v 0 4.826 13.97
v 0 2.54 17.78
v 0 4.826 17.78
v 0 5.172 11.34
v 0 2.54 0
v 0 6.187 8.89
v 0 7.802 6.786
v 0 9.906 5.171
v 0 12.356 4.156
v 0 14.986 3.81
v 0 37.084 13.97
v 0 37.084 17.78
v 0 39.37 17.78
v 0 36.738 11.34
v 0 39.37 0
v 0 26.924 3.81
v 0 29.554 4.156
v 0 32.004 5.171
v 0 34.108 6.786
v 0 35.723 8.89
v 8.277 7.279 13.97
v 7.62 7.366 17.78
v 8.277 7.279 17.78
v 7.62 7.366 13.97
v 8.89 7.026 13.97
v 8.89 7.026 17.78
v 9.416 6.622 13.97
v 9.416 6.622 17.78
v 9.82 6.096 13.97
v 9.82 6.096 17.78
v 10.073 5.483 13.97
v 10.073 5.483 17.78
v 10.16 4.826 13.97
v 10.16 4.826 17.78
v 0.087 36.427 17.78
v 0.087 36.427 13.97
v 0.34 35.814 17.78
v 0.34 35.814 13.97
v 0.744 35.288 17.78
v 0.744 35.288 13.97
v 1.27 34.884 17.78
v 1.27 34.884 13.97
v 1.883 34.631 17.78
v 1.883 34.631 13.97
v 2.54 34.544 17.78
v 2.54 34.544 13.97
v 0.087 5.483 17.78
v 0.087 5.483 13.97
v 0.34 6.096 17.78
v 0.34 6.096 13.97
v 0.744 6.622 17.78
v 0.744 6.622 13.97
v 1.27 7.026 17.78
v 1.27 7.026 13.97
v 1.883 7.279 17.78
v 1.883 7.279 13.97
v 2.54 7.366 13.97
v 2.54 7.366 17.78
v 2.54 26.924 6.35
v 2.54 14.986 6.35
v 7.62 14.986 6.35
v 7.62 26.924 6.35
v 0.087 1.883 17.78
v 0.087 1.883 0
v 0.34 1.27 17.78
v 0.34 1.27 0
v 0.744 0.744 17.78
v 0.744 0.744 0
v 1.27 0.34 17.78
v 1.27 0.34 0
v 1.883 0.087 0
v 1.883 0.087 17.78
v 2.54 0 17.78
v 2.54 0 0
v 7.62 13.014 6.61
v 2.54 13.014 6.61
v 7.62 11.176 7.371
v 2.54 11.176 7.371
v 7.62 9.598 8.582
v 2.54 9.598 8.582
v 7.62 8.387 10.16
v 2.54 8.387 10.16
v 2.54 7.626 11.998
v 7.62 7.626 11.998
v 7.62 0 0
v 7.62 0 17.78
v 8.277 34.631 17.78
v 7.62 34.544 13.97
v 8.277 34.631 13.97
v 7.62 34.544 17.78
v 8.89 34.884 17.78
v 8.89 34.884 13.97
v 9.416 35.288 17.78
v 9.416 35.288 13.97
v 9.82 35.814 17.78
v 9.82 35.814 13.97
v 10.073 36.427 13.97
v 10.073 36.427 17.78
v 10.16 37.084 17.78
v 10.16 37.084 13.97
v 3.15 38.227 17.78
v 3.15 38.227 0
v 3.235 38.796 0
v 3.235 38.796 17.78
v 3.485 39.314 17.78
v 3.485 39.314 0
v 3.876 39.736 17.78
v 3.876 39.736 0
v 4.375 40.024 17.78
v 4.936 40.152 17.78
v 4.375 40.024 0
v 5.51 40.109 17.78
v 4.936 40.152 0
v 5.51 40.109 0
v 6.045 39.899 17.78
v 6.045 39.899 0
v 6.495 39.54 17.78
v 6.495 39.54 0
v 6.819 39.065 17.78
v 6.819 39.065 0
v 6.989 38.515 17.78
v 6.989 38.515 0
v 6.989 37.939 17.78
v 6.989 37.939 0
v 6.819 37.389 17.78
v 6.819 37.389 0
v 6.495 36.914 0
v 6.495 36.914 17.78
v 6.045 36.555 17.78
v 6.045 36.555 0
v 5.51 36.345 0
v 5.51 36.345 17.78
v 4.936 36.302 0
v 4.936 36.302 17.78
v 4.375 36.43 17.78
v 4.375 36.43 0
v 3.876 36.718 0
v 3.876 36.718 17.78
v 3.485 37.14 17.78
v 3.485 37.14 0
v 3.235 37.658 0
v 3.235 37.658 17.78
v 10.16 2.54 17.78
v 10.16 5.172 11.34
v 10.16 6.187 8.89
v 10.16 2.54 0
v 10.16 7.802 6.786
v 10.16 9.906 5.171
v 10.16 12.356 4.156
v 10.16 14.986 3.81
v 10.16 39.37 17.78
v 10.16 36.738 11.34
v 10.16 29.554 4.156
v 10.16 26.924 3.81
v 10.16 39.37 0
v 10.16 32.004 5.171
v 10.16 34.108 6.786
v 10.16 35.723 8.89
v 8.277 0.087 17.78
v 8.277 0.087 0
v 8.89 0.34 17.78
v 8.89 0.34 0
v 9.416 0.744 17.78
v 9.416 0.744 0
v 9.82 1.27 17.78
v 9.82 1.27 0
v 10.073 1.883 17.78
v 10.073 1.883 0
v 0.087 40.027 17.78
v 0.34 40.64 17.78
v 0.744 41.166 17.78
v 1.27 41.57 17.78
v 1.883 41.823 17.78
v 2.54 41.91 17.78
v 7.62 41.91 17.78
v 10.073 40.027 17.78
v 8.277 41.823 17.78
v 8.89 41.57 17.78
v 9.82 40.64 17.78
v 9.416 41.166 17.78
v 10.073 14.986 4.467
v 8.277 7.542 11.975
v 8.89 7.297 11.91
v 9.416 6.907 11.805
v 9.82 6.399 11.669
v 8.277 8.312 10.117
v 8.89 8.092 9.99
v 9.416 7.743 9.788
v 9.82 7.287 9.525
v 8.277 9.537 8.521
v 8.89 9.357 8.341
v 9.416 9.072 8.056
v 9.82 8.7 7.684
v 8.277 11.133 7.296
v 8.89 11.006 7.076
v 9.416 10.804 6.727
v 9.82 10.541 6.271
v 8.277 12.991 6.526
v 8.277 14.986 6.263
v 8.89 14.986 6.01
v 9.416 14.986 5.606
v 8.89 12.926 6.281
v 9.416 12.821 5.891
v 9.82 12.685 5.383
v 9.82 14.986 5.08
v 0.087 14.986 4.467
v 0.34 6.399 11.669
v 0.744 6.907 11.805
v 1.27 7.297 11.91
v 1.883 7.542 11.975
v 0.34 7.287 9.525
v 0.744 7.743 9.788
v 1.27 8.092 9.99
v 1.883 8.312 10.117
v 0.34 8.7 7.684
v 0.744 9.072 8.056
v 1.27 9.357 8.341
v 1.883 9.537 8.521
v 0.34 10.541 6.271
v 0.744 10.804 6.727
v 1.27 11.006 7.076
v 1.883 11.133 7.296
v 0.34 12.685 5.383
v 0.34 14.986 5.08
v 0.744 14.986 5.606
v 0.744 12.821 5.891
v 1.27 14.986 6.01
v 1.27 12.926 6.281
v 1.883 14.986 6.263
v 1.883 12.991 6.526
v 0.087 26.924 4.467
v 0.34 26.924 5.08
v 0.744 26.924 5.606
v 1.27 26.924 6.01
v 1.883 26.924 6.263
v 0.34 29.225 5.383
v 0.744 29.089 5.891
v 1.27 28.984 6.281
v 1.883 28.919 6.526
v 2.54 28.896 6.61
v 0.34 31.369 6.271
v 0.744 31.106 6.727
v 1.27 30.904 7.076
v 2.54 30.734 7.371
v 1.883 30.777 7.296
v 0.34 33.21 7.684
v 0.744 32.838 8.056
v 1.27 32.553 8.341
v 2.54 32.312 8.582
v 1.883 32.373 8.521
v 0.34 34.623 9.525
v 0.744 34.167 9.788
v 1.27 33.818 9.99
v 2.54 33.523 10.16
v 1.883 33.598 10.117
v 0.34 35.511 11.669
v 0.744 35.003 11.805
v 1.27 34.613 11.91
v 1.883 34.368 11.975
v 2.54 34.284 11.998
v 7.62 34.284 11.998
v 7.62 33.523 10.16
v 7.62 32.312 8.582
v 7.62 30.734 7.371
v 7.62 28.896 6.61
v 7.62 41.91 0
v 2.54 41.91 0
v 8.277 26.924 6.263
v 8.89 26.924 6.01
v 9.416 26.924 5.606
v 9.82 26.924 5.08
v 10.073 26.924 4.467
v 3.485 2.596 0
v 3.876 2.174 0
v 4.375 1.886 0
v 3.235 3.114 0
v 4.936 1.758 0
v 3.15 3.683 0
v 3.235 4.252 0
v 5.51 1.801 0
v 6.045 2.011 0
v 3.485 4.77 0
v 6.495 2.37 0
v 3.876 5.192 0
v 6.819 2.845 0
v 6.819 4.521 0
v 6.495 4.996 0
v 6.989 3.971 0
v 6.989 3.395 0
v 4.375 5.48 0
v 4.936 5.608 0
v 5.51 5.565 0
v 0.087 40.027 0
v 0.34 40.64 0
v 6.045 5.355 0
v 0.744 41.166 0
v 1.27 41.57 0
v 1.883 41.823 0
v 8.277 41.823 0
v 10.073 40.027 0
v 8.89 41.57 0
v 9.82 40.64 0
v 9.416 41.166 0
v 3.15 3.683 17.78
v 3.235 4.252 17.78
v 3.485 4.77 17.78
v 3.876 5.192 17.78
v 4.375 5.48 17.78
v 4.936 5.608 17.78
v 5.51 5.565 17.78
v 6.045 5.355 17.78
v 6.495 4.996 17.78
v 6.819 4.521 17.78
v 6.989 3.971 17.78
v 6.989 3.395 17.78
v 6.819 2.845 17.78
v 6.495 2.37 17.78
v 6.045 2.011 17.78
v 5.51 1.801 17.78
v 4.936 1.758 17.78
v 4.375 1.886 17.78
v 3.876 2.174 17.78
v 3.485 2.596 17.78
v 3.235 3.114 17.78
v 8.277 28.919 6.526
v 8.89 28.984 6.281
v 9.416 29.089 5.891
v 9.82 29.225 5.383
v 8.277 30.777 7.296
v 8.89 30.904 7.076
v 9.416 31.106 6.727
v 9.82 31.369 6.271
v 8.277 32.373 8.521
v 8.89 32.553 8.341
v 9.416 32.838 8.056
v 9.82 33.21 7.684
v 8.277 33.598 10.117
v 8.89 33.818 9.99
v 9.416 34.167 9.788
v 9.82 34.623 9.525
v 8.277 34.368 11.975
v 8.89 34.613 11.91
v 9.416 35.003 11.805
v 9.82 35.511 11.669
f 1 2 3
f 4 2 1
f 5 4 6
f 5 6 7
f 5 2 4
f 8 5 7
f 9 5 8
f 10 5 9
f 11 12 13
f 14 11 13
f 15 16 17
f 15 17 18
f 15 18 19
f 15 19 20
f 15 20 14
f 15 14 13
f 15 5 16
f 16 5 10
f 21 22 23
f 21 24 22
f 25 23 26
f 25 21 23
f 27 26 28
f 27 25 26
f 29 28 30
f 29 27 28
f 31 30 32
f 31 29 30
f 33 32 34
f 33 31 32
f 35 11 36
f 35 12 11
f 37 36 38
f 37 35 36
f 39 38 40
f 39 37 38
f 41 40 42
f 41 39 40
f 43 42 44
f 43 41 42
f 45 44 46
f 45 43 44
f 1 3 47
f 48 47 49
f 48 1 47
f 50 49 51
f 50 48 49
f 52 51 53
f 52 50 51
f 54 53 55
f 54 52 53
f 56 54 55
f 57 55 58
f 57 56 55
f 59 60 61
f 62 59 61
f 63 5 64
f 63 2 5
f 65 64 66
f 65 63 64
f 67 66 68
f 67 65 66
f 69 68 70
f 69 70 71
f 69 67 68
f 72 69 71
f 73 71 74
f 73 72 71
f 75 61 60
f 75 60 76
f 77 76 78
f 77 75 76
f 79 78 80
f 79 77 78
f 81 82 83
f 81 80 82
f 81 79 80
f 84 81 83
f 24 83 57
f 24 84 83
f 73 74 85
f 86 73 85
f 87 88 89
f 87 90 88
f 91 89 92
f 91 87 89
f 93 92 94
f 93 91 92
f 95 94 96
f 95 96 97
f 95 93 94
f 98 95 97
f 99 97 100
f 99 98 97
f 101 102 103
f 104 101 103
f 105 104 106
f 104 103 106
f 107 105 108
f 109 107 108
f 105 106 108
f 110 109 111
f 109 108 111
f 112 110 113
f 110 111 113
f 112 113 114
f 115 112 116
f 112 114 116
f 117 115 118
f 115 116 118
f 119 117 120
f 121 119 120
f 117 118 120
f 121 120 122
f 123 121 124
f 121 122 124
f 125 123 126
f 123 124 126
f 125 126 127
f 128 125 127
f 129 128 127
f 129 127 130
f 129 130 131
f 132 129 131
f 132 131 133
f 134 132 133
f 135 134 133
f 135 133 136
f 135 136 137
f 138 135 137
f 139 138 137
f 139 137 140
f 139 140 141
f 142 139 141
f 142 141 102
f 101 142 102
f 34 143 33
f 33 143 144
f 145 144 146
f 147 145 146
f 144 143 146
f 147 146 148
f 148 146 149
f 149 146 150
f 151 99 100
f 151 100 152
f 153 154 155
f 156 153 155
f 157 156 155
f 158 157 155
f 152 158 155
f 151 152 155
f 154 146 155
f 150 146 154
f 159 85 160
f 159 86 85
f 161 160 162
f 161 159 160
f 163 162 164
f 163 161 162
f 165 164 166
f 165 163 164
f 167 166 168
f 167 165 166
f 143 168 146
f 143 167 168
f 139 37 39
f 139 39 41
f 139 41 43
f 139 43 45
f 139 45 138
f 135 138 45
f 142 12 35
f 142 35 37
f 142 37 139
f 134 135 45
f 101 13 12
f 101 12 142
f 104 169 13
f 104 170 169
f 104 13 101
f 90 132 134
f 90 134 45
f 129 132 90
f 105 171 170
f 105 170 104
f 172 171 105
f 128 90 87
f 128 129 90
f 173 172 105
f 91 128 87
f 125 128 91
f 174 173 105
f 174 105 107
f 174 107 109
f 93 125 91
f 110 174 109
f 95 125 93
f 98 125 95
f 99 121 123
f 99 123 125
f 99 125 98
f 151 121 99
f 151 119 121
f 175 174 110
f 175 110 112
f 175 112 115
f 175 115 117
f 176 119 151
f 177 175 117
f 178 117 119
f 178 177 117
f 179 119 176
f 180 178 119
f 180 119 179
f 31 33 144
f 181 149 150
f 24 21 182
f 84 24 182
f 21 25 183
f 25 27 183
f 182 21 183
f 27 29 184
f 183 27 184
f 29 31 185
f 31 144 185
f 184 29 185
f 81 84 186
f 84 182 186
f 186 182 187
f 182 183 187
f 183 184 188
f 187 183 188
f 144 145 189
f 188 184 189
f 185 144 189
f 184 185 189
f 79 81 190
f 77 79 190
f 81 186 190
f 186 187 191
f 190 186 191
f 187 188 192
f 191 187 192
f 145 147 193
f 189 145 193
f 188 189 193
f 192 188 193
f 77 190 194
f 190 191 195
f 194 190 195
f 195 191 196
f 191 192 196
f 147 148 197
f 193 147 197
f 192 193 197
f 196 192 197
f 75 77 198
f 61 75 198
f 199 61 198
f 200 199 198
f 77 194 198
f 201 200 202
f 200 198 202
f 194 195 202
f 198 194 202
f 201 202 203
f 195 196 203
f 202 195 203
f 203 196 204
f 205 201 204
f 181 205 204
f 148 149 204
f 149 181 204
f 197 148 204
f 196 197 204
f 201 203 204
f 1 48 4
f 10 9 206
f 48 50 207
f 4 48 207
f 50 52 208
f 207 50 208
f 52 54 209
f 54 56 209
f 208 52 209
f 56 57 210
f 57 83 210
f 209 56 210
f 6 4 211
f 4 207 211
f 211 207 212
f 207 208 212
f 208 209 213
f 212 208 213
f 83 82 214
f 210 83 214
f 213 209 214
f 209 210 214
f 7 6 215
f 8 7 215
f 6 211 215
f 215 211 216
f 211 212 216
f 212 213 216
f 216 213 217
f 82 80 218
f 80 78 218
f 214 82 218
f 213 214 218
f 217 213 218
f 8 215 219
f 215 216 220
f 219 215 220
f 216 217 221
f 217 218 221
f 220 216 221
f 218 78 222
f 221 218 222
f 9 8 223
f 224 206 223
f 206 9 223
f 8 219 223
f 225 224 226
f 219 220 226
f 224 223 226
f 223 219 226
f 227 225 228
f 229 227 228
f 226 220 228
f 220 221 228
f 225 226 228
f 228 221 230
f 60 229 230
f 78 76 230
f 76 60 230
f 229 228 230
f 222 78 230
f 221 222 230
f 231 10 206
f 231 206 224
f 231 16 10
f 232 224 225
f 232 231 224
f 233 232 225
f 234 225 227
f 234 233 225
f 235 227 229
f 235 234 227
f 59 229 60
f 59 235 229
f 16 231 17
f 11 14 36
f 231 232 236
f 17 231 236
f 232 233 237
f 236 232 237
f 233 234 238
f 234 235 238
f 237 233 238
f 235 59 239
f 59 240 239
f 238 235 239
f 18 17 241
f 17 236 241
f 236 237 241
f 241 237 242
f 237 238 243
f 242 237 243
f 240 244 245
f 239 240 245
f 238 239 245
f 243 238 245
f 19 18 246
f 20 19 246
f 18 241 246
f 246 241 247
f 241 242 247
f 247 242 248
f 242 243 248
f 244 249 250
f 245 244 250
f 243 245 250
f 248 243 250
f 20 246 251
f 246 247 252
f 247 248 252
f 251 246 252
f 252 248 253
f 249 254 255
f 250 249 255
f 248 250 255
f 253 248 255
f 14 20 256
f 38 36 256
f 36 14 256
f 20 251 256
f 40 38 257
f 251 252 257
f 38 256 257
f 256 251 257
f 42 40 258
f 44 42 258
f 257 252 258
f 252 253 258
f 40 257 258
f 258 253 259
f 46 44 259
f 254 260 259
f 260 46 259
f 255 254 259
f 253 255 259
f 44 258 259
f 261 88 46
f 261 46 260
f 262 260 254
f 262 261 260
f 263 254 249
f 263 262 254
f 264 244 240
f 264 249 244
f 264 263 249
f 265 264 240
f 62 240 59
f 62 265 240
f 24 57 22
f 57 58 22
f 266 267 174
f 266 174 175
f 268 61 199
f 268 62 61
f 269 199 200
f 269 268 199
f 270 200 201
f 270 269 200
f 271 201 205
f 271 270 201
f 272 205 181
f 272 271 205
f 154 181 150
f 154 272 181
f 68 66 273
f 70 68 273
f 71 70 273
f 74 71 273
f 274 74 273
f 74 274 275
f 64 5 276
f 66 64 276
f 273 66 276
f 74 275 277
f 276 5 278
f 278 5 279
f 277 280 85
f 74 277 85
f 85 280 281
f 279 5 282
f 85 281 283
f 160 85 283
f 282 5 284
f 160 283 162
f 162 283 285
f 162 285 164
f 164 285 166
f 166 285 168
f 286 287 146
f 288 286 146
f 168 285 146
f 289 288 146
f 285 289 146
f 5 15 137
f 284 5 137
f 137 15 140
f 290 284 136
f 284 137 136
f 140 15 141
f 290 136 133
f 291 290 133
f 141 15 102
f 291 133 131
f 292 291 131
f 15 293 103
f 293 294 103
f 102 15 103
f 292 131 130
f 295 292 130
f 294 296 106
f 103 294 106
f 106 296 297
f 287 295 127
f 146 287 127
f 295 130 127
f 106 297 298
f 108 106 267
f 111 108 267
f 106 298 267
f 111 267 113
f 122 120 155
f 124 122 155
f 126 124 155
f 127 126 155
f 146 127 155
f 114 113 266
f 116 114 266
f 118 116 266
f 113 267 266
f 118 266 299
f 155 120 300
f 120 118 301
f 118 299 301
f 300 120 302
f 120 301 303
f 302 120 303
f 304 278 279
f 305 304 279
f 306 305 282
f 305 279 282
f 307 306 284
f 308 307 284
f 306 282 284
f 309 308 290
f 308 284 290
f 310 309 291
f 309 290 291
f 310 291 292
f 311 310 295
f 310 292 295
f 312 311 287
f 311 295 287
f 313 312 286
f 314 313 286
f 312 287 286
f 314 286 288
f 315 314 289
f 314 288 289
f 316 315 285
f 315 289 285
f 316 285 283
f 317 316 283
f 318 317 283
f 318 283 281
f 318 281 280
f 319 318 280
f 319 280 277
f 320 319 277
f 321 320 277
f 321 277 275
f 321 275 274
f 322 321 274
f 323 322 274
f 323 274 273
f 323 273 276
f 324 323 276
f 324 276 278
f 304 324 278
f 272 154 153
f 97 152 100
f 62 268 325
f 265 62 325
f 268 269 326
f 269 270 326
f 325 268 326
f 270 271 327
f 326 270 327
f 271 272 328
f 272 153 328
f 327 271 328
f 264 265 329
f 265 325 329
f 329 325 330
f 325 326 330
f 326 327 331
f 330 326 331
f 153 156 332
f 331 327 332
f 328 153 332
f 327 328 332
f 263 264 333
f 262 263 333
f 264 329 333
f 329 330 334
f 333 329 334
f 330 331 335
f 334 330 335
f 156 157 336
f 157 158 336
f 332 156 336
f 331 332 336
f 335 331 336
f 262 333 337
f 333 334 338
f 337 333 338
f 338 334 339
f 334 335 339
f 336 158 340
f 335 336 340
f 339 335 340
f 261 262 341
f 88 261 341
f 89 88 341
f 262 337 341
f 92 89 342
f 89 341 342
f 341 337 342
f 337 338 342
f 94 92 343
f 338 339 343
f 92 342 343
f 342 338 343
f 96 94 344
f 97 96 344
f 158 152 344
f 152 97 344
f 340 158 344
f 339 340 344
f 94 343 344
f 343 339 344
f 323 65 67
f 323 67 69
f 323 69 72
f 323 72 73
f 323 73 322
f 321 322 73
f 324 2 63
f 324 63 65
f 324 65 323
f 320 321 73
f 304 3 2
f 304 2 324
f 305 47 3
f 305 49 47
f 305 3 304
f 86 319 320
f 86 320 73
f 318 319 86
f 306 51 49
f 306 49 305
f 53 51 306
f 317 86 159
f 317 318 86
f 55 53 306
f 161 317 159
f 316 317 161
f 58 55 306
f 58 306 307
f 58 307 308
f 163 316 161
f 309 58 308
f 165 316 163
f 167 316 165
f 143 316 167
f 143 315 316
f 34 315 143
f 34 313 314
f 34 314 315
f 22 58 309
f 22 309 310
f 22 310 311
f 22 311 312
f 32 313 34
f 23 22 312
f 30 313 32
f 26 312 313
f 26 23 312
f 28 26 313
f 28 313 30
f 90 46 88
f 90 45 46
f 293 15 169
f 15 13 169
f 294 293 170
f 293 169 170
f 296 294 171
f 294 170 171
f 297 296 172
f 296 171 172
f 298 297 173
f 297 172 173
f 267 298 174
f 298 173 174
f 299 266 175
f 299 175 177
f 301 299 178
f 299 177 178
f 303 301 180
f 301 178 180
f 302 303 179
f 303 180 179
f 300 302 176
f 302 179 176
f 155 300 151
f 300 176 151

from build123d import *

# Parameters (mm, degrees)
SKETCH1_W                   = 10.16
SKETCH1_H                   = 41.91
BOSS_EXTRUDE1_DEPTH         = 17.78
SKETCH2_W                   = 10.16
SKETCH2_H                   = 27.178
CUT_EXTRUDE1_DEPTH          = 11.43
F_24_0_152_DIAMETER_HOLE1_D = 3.8608
FILLET1_R                   = 7.62
FILLET2_R                   = 2.54


with BuildPart() as part:
    # Sketch1 → Boss-Extrude1 (new body)
    with BuildSketch(Plane.XY):
        with Locations((5.08, 20.955)):
            Rectangle(SKETCH1_W, SKETCH1_H)
    extrude(amount=BOSS_EXTRUDE1_DEPTH)

    # Sketch2 → Cut-Extrude1 (cut)
    with BuildSketch(Plane.XY.offset(17.78)):
        with Locations((5.08, 20.955)):
            Rectangle(SKETCH2_W, SKETCH2_H)
    extrude(amount=-CUT_EXTRUDE1_DEPTH, mode=Mode.SUBTRACT)

    # #24 (0.152) Diameter Hole1 (through all)
    with Locations(Plane.XY.offset(17.78)):
        with Locations((5.08, 3.683), (5.08, 38.227)):
            Hole(F_24_0_152_DIAMETER_HOLE1_D / 2)

    # Fillet1
    fillet1_edges = [part.edges().sort_by_distance(p)[0] for p in [
        (5.08, 7.366, 6.35),
        (5.08, 34.544, 6.35),
    ]]
    fillet(fillet1_edges, radius=FILLET1_R)

    # Fillet2
    fillet2_edges = [part.edges().sort_by_distance(p)[0] for p in [
        (0, 20.955, 6.35),
        (10.16, 20.955, 6.35),
        (0, 7.366, 15.875),
        (10.16, 7.366, 15.875),
        (10.16, 34.544, 15.875),
        (0, 34.544, 15.875),
        (10.16, 9.597846327, 8.581846327),
        (0, 9.597846327, 8.581846327),
        (0, 32.312153673, 8.581846327),
        (10.16, 32.312153673, 8.581846327),
        (0, 41.91, 8.89),
        (10.16, 41.91, 8.89),
        (10.16, 0, 8.89),
        (0, 0, 8.89),
    ]]
    fillet(fillet2_edges, radius=FILLET2_R)


solid = part.part
